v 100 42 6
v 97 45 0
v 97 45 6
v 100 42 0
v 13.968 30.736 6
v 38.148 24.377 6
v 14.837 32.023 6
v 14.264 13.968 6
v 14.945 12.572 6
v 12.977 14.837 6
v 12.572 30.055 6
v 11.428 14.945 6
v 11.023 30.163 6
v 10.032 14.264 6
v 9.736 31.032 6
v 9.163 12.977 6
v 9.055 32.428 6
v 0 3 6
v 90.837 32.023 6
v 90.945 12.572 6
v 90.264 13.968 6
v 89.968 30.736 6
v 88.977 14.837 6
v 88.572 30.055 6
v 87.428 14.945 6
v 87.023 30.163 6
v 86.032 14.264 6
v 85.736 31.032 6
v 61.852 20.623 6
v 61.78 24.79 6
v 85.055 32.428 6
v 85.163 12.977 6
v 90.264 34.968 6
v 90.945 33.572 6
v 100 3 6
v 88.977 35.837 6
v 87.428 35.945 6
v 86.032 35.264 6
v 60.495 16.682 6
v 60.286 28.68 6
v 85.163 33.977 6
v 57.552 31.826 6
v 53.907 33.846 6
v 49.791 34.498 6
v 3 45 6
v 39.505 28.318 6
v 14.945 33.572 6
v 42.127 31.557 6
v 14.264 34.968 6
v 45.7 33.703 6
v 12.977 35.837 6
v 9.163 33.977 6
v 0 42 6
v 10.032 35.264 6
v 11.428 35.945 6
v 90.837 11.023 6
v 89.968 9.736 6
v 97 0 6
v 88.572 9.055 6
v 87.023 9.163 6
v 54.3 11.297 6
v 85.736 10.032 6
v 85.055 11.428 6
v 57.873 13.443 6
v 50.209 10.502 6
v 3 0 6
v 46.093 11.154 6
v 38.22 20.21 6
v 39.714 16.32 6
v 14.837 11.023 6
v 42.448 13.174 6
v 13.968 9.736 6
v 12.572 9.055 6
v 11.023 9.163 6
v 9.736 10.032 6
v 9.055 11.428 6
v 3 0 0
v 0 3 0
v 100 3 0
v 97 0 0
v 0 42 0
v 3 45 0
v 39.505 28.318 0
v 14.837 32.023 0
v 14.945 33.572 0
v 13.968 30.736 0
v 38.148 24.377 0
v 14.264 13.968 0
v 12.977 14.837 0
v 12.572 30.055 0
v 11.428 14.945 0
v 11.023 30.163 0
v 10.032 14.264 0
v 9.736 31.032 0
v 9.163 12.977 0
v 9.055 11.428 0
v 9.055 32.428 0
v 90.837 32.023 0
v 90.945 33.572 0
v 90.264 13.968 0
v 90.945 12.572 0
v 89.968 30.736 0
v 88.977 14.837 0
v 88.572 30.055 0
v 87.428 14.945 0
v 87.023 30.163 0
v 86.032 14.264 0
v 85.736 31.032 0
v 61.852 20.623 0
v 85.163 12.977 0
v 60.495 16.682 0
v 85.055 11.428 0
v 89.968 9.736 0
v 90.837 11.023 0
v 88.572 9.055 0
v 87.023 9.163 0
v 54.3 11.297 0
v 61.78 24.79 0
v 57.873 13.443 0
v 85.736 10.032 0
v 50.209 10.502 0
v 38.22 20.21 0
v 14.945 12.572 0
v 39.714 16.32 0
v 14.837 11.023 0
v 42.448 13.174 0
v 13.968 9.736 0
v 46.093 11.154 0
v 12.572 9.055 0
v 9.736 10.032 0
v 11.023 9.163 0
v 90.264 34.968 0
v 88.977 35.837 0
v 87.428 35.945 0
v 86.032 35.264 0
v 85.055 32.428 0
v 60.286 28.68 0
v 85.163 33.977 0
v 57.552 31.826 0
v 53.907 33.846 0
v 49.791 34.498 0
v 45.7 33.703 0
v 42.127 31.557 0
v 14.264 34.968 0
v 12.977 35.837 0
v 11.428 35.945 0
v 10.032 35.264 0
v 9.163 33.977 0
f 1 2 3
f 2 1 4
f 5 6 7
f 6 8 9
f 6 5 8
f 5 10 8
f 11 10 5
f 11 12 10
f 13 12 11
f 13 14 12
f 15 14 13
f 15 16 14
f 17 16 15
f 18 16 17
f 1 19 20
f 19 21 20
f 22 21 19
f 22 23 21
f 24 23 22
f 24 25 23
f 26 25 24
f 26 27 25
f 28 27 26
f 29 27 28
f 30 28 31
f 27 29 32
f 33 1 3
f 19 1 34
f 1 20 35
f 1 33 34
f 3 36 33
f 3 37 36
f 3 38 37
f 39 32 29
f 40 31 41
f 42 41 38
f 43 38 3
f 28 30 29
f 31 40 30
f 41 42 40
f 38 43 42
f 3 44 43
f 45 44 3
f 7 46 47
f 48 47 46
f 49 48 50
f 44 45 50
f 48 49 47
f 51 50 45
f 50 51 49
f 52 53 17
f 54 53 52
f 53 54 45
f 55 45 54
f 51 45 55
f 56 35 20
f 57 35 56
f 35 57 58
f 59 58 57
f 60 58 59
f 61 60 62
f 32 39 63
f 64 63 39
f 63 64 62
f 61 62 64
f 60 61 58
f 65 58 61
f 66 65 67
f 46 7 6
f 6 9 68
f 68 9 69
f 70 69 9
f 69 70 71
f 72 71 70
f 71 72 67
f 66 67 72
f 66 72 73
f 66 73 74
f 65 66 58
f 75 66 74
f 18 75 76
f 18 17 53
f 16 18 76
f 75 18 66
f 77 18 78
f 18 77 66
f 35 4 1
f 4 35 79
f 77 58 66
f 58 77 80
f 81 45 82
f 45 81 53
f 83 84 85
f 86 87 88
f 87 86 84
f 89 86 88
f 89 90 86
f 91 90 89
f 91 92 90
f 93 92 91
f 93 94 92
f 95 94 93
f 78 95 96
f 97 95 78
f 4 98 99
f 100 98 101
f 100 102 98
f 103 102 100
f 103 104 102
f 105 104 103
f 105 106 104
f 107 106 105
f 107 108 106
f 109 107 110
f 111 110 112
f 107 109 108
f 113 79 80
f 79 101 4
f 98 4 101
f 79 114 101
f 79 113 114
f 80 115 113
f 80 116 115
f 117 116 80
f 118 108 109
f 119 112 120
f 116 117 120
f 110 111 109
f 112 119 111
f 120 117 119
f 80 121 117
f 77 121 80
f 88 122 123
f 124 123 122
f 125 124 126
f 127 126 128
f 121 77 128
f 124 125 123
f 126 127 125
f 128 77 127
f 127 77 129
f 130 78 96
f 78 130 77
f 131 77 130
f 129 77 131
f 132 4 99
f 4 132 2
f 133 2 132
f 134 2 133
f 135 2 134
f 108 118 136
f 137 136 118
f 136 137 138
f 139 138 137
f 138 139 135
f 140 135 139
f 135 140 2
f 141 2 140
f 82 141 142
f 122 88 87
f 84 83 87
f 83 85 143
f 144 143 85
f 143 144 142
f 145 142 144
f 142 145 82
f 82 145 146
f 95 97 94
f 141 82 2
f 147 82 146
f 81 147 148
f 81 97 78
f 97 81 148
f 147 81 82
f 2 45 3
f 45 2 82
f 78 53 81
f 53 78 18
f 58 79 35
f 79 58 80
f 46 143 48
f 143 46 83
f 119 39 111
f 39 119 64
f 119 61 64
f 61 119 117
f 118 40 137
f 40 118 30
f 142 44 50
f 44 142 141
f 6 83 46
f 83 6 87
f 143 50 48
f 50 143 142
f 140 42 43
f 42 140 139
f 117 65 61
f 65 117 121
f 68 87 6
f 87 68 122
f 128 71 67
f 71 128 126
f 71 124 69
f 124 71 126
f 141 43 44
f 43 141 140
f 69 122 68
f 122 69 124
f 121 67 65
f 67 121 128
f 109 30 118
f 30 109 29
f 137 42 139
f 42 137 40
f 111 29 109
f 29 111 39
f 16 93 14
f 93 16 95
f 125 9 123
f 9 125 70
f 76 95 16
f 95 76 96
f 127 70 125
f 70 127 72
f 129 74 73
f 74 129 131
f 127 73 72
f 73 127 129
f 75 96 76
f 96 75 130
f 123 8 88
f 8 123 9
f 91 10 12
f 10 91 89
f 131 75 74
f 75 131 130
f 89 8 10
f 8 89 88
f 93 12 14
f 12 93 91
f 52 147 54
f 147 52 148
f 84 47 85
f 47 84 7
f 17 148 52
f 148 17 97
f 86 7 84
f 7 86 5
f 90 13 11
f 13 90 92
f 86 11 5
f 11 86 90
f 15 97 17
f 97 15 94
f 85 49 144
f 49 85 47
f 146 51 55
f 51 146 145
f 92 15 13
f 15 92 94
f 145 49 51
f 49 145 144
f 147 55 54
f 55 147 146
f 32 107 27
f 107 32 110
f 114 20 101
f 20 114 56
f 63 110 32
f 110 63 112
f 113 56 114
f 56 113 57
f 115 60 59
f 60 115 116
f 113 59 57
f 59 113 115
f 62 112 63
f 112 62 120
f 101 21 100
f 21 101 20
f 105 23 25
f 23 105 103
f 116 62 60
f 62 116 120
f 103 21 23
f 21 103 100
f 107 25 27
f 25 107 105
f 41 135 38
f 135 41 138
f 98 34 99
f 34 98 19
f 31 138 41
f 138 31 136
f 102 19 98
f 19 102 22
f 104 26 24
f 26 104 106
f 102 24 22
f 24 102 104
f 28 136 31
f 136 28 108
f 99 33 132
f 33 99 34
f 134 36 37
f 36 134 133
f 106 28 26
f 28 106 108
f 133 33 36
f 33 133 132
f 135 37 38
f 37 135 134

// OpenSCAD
$fn = 32;

// ----------------------------------------------------------------------
// Spacer plate: rect 100 x 45
// ----------------------------------------------------------------------

// --- parameters (mm) ---
bore_r = 12;              // centre bore radius
bolt_r = 3;               // bolt hole radius
plate_t = 6;              // plate thickness, Z (extrusion height)
plate_l = 100;            // plate length, X
plate_w = 45;             // plate width, Y
inset = 12;               // corner hole inset

profile = [[3, 0], [97, 0], [100, 3], [100, 42], [97, 45], [3, 45], [0, 42], [0, 3]];  // primary outline, 8 points, counter clockwise
void_1 = [[61.78, 24.79], [60.286, 28.68], [57.552, 31.826], [53.907, 33.846], [49.791, 34.498], [45.7, 33.703], [42.127, 31.557], [39.505, 28.318], [38.148, 24.377], [38.22, 20.21], [39.714, 16.32], [42.448, 13.174], [46.093, 11.154], [50.209, 10.502], [54.3, 11.297], [57.873, 13.443], [60.495, 16.682], [61.852, 20.623]];  // centre bore, 18 points
void_2 = [[14.945, 12.572], [14.264, 13.968], [12.977, 14.837], [11.428, 14.945], [10.032, 14.264], [9.163, 12.977], [9.055, 11.428], [9.736, 10.032], [11.023, 9.163], [12.572, 9.055], [13.968, 9.736], [14.837, 11.023]];  // corner hole, 12 points
void_3 = [[14.945, 33.572], [14.264, 34.968], [12.977, 35.837], [11.428, 35.945], [10.032, 35.264], [9.163, 33.977], [9.055, 32.428], [9.736, 31.032], [11.023, 30.163], [12.572, 30.055], [13.968, 30.736], [14.837, 32.023]];  // corner hole, 12 points
void_4 = [[90.945, 12.572], [90.264, 13.968], [88.977, 14.837], [87.428, 14.945], [86.032, 14.264], [85.163, 12.977], [85.055, 11.428], [85.736, 10.032], [87.023, 9.163], [88.572, 9.055], [89.968, 9.736], [90.837, 11.023]];  // corner hole, 12 points
void_5 = [[90.945, 33.572], [90.264, 34.968], [88.977, 35.837], [87.428, 35.945], [86.032, 35.264], [85.163, 33.977], [85.055, 32.428], [85.736, 31.032], [87.023, 30.163], [88.572, 30.055], [89.968, 30.736], [90.837, 32.023]];  // corner hole, 12 points

// --- the one profile operation ---
difference() {
  linear_extrude(height = plate_t) polygon(points = profile);
  translate([0, 0, -1])
    linear_extrude(height = plate_t + 2) polygon(points = void_1);
  translate([0, 0, -1])
    linear_extrude(height = plate_t + 2) polygon(points = void_2);
  translate([0, 0, -1])
    linear_extrude(height = plate_t + 2) polygon(points = void_3);
  translate([0, 0, -1])
    linear_extrude(height = plate_t + 2) polygon(points = void_4);
  translate([0, 0, -1])
    linear_extrude(height = plate_t + 2) polygon(points = void_5);
}
